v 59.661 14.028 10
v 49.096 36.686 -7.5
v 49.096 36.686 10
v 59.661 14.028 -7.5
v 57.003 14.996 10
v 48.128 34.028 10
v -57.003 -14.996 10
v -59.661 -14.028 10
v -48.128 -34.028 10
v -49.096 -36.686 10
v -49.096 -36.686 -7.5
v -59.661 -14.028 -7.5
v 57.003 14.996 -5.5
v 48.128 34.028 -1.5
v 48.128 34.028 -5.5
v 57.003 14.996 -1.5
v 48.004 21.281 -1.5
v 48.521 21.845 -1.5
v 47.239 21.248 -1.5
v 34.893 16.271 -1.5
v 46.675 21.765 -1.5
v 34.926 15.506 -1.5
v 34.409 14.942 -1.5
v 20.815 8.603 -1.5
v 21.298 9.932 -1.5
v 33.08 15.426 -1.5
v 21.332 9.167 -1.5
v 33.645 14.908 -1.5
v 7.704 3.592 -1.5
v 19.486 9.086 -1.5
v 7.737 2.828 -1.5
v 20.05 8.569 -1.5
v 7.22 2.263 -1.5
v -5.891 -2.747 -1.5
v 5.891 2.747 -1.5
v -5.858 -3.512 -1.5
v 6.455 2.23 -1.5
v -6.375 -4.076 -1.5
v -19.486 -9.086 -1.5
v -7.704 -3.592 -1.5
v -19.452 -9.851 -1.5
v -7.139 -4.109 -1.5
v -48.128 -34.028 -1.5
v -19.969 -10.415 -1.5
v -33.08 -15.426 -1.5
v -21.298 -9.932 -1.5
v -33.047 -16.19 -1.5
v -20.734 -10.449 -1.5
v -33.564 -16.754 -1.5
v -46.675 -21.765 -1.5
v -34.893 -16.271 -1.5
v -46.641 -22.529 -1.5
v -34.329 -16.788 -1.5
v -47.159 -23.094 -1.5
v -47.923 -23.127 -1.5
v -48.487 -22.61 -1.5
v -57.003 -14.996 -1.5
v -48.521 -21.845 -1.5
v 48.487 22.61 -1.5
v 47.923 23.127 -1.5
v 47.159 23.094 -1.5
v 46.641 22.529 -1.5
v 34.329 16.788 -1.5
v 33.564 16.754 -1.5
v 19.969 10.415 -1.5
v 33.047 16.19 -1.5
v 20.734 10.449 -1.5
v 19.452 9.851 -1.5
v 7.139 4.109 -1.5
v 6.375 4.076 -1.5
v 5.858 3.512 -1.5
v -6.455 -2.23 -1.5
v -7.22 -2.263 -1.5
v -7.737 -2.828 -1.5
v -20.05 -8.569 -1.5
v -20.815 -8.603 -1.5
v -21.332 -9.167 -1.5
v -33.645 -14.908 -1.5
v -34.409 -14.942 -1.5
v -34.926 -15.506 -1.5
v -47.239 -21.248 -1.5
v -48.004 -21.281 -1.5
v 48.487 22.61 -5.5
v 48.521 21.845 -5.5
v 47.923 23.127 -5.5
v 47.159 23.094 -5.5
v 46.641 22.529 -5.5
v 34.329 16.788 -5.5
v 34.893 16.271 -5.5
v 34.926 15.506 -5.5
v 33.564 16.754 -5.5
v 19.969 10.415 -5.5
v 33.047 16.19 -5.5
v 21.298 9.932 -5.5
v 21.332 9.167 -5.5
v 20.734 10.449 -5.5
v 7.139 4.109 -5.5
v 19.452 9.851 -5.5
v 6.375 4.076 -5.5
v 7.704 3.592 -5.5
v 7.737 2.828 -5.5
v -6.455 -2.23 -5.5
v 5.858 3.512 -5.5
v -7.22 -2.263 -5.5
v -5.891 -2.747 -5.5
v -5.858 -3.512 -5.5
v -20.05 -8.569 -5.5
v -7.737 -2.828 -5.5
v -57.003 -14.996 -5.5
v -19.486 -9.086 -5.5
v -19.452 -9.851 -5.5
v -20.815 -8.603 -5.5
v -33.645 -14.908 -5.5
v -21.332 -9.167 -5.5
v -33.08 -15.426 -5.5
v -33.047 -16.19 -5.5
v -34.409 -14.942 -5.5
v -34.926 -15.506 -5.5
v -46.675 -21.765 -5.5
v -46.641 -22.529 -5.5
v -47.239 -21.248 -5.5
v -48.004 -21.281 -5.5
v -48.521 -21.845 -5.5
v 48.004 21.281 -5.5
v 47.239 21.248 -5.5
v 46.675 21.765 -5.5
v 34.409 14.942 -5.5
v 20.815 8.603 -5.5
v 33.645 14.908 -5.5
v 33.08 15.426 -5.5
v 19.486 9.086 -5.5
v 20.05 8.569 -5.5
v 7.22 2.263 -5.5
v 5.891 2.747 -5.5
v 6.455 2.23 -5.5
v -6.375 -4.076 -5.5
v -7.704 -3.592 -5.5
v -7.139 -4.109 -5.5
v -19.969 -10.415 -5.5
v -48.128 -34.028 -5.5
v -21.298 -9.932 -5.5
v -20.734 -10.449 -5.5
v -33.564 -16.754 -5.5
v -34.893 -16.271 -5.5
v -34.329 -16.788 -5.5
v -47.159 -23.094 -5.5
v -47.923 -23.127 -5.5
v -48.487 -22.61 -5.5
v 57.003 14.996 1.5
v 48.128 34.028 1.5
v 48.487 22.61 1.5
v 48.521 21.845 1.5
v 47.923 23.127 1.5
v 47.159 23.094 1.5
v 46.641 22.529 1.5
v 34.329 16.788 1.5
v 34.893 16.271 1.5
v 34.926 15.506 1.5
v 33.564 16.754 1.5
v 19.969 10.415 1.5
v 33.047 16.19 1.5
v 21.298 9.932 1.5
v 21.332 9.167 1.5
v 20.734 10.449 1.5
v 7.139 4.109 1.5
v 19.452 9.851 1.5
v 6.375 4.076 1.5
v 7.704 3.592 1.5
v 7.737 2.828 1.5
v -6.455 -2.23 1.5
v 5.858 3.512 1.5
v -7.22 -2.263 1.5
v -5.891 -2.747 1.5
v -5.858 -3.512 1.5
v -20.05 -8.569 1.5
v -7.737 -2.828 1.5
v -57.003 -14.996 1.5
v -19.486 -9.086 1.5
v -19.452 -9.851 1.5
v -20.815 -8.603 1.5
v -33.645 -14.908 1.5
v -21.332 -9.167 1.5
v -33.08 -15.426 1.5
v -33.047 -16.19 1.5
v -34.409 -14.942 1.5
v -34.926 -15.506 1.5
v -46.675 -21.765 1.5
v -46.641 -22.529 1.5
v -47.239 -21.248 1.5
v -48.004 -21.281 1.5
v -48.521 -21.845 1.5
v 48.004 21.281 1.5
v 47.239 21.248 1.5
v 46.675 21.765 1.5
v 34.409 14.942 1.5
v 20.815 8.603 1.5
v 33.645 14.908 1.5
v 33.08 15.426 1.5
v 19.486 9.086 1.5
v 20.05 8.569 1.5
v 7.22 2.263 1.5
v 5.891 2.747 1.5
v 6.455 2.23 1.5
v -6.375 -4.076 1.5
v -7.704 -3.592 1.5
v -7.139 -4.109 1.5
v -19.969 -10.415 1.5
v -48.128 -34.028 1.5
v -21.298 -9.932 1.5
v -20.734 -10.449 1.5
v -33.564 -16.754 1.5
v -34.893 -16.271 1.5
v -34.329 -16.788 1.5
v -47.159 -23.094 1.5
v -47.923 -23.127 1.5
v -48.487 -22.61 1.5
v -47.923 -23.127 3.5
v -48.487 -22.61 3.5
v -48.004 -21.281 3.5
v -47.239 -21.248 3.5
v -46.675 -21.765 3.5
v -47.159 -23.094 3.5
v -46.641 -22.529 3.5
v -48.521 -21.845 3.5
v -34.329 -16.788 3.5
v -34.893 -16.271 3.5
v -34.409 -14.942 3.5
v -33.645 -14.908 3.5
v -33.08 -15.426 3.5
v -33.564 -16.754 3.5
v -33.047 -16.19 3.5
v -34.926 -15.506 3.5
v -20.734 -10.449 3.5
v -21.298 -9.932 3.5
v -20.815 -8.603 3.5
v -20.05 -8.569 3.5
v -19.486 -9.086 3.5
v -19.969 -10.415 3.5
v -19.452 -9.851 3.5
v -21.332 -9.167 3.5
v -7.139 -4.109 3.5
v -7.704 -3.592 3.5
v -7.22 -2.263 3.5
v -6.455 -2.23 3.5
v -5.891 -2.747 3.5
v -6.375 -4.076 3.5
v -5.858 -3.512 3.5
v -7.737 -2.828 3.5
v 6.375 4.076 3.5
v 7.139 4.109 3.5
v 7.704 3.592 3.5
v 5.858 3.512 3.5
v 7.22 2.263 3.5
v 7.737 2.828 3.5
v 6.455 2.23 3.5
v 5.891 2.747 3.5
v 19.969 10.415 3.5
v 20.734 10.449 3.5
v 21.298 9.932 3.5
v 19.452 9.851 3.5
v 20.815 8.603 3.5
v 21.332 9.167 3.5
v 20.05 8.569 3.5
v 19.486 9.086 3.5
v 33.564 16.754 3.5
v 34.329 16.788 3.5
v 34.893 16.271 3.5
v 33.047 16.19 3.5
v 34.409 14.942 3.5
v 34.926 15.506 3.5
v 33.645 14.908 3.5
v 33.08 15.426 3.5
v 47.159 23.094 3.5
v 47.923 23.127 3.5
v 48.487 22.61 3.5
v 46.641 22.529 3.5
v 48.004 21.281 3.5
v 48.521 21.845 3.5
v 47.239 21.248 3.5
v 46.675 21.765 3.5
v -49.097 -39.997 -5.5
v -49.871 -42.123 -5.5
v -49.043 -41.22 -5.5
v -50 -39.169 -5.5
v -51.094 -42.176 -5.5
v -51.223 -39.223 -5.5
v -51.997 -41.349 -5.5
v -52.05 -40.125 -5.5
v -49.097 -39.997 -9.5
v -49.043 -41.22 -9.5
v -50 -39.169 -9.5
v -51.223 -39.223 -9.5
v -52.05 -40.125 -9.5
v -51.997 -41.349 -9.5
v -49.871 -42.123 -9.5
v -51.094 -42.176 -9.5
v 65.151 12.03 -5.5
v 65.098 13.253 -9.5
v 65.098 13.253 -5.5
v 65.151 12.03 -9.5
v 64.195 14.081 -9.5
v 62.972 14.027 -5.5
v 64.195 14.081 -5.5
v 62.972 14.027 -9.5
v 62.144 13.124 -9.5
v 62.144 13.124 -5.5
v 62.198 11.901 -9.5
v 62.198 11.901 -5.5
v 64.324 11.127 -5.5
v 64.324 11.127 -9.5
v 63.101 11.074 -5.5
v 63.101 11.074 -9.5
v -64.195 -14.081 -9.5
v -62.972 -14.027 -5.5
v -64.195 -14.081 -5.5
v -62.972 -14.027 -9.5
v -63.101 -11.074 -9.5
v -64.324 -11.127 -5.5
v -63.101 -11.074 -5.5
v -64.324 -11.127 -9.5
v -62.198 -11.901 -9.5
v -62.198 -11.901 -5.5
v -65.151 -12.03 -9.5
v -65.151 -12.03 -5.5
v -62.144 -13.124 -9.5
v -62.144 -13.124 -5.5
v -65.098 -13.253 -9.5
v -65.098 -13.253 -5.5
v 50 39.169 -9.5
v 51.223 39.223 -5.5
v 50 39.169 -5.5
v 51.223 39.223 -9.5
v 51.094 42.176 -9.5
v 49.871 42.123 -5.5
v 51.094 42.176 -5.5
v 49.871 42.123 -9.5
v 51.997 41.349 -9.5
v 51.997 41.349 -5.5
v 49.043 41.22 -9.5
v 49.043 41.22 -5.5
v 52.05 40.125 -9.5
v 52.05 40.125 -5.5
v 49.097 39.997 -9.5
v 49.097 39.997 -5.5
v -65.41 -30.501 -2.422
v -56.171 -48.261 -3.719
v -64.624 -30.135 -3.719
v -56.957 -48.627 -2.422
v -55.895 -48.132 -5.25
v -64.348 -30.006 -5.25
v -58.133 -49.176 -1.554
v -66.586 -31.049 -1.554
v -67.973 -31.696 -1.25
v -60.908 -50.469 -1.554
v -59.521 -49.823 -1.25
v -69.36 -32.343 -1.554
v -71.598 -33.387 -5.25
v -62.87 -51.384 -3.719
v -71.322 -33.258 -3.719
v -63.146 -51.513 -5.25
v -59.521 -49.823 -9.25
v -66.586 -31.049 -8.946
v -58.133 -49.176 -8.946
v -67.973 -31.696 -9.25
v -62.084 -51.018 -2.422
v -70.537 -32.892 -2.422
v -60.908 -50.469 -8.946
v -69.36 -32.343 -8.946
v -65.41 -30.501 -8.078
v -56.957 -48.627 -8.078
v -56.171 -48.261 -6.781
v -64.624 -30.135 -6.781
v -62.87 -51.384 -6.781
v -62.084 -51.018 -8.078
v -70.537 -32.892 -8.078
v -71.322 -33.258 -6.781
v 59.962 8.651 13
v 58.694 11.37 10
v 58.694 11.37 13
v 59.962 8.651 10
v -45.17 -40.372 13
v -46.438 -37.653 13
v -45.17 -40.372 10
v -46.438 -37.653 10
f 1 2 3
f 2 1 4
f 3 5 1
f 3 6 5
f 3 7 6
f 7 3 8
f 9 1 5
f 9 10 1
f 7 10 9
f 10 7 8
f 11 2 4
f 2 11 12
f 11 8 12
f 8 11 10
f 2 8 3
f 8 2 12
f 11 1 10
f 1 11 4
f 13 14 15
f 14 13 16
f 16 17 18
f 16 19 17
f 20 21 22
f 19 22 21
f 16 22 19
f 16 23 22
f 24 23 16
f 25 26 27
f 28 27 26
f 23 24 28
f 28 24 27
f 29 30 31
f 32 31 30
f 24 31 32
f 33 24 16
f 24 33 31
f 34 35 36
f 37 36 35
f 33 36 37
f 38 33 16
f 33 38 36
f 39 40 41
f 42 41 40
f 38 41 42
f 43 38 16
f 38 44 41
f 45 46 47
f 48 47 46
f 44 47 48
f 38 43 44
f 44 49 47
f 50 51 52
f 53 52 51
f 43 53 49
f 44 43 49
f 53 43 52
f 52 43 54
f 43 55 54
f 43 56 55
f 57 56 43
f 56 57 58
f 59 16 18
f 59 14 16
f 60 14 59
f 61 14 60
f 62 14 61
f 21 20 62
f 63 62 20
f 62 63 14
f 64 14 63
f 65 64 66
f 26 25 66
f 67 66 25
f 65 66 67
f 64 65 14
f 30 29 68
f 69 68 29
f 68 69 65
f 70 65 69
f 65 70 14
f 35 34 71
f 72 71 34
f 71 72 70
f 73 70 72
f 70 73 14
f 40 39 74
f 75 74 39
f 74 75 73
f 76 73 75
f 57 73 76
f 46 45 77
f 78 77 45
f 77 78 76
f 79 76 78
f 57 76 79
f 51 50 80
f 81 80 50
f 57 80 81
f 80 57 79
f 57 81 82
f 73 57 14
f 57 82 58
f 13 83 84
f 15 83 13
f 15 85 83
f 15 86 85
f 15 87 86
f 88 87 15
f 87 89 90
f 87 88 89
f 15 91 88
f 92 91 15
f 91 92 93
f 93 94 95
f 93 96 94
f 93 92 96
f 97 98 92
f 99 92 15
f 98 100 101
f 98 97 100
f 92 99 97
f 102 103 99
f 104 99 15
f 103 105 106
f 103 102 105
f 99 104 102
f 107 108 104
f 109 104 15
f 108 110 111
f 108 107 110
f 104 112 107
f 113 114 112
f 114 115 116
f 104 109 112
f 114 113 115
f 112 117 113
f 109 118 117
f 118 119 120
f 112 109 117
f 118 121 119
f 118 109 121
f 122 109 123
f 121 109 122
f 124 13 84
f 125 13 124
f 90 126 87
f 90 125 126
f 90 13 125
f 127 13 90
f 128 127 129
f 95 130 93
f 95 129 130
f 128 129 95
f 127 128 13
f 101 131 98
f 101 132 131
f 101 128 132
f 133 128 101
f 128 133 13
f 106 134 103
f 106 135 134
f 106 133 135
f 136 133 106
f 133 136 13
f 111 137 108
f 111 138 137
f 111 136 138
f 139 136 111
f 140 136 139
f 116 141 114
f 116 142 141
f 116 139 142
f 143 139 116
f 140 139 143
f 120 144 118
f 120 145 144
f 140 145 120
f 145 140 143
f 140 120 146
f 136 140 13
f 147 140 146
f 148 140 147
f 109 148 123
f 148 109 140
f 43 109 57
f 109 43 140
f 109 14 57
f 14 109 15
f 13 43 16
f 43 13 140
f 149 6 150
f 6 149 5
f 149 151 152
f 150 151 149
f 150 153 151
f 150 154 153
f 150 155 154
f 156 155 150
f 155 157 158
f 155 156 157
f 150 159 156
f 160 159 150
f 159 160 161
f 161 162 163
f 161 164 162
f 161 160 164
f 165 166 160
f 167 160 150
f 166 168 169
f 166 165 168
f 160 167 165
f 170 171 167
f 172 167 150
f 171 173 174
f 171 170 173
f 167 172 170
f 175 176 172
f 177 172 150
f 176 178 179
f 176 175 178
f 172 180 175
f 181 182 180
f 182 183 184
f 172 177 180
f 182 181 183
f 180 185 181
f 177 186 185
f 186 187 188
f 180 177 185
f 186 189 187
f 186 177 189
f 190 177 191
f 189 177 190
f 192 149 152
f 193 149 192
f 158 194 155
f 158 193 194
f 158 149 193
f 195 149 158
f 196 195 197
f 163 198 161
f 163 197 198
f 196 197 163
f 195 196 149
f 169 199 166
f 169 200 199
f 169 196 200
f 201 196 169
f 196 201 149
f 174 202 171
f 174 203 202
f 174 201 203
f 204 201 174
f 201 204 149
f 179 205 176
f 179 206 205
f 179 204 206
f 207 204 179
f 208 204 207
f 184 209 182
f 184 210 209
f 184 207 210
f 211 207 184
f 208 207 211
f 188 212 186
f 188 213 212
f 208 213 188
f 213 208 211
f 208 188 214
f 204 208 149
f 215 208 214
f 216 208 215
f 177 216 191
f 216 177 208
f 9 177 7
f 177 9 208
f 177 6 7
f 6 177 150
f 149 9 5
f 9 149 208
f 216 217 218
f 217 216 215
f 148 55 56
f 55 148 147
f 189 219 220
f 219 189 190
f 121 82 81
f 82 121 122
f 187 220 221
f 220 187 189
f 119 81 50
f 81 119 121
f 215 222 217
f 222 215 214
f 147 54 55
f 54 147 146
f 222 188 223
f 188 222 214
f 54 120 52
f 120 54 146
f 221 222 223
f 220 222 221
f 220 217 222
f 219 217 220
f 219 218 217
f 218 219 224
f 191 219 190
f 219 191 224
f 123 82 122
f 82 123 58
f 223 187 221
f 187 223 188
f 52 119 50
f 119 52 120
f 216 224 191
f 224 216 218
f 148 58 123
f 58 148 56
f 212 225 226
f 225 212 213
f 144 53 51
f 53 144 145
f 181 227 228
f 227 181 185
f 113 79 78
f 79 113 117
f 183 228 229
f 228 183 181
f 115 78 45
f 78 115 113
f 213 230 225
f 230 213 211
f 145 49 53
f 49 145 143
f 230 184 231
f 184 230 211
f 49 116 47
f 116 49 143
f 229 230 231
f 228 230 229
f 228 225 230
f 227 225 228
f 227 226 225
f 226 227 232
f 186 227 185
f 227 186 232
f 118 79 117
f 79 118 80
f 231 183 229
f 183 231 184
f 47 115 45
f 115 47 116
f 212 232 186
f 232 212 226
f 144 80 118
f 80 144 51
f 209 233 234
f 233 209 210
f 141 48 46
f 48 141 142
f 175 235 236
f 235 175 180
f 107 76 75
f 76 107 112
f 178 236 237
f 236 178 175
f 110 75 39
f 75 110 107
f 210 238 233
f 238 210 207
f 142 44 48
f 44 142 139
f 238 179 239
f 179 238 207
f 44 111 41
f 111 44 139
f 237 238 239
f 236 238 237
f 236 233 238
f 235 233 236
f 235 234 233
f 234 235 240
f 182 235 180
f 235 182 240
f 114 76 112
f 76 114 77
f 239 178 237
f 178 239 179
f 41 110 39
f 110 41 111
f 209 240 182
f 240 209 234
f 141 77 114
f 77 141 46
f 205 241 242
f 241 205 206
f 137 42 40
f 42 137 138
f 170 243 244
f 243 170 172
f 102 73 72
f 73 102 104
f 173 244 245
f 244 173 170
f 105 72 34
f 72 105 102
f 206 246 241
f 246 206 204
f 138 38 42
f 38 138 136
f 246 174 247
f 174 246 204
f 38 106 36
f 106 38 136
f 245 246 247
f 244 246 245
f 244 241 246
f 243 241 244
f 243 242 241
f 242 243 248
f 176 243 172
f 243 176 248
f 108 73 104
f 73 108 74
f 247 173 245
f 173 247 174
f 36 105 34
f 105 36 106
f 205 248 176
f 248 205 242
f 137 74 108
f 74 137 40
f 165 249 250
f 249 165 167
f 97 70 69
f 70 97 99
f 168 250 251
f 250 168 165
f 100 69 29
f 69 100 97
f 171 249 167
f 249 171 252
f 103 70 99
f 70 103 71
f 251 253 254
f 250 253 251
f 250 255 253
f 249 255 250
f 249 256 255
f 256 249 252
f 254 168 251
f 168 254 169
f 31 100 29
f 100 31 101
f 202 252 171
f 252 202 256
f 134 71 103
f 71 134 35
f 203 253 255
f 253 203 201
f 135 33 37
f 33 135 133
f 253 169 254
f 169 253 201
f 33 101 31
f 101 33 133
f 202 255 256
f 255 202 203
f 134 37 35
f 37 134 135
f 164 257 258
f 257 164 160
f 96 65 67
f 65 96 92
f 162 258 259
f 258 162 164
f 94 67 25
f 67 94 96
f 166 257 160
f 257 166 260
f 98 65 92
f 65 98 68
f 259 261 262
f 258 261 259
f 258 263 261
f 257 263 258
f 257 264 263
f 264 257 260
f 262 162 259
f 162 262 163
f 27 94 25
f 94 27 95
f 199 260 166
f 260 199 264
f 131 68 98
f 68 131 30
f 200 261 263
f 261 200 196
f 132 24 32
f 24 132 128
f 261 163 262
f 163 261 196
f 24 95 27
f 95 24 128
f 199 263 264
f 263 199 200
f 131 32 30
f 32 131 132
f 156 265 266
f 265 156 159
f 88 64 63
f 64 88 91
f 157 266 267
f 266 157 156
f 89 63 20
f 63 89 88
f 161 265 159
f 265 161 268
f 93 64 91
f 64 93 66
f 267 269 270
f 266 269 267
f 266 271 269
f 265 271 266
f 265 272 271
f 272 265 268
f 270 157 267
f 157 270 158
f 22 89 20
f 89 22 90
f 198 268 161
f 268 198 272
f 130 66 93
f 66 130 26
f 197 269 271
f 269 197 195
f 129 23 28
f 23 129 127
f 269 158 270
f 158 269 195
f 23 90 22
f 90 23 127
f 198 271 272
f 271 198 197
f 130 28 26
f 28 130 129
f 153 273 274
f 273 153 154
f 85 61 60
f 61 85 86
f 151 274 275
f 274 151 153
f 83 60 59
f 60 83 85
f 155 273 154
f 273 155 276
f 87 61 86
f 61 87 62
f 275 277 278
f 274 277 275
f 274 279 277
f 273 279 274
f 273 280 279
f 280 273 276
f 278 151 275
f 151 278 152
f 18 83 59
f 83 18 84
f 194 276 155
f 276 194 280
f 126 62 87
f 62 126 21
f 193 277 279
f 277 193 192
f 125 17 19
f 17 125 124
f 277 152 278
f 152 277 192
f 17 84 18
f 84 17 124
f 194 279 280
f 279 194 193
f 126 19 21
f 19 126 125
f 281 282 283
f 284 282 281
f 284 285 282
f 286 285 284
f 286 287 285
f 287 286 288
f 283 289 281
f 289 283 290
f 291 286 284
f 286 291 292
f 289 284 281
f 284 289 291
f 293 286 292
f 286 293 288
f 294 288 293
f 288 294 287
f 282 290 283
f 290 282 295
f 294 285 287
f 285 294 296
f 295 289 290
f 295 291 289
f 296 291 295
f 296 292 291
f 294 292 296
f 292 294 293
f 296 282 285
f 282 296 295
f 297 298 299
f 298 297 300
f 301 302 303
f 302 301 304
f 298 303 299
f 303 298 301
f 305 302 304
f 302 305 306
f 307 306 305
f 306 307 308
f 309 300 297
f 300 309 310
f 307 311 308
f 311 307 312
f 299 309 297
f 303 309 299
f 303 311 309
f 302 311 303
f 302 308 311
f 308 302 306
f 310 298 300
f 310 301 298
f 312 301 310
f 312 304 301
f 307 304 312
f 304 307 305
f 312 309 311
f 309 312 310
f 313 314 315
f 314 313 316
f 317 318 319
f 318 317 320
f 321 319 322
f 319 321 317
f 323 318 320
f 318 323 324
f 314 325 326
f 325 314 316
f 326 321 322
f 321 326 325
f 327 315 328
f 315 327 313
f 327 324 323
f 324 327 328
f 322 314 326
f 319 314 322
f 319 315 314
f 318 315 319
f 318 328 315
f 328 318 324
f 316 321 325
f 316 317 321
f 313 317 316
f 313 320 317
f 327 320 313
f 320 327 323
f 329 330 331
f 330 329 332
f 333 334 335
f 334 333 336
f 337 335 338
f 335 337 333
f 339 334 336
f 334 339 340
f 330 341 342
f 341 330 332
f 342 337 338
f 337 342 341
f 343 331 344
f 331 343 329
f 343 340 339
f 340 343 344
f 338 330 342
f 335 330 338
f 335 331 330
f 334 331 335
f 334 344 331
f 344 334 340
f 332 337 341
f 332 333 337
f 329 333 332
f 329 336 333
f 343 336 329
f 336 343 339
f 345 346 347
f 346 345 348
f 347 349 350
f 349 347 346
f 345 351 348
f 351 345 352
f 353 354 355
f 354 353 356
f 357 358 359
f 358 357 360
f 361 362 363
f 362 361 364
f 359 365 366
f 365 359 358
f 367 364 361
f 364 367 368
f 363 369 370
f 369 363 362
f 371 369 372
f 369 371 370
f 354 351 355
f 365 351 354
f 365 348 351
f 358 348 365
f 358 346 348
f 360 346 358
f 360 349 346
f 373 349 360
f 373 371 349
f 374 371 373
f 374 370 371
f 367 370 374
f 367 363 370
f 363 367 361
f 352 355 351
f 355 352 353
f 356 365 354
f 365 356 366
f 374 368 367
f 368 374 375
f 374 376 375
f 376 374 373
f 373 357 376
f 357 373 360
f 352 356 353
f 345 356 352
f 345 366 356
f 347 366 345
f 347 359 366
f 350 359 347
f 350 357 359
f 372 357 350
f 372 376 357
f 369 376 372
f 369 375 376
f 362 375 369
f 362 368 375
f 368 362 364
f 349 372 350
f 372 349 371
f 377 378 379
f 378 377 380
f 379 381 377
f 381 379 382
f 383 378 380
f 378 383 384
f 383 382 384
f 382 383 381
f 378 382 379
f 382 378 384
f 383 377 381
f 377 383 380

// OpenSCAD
// Two-Stage Density Sorting Channel — Stage 2
// HUSKY-SORTER-001 | Topic 4 Day 2 | 2026-04-14
// *** REQUIRES TURBO BLOWER (300+ L/min) — 5015 INSUFFICIENT ***
// Fan: Turbo blower -> 25x10mm -> Medium vs Heavy separation
// Design: theta=25deg, v_air target 200-230cm/s
//
// v2 2026-05-17: Plenum moved BELOW channel, nozzles blow UPWARD through floor
// Previous: plenum was on side wall, nozzles blew sideways (rotate[90,0,0] error)
// Also fixed: stage2 baffle was entirely below channel floor (no escape path)
// Also fixed: nozzle dia 1.5mm -> 2.0mm for FDM printability

channel_L   = 120;
channel_W   = 25;
channel_H   = 10;
wall        = 2;
plenum_W    = 12;
plenum_H    = 6;
floor_H     = 1.5;
slope_deg   = 25;
baffle_H    = 3;

rotate([0, 0, slope_deg]) {
    difference() {
        // Outer shell
        translate([-channel_L/2, -channel_W/2, -(plenum_H + floor_H)])
            cube([channel_L, channel_W, channel_H + floor_H + plenum_H]);

        // Plenum cavity (bottom section)
        translate([-channel_L/2+wall, -channel_W/2+wall, -plenum_H-floor_H+wall])
            cube([channel_L-2*wall, channel_W-2*wall, plenum_H-wall]);

        // Channel interior (above floor)
        translate([-channel_L/2+wall, -channel_W/2+wall, floor_H])
            cube([channel_L-2*wall, channel_W-2*wall, channel_H]);
    }

    // Nozzle holes: vertical (Z-axis) through floor — 8x phi2mm
    for (i=[0:7]) {
        x = -channel_L/2 + (i+0.5)*(channel_L/8);
        translate([x, 0, -plenum_H])
            cylinder(h=plenum_H + floor_H + 2, d=2.0, $fn=8);
    }

    // Air inlet: horizontal into plenum from front face
    translate([-channel_L/2-15, 0, -(plenum_H+floor_H)/2 - floor_H])
        rotate([90, 0, 0]) cylinder(h=20, d=8, $fn=16);

    // Top escape baffle (at channel TOP where beans can escape upward)
    translate([-channel_L/2+2, -channel_W/2-wall-baffle_H, channel_H])
        cube([channel_L-4, baffle_H, baffle_H]);

    // Mounting flanges 4x M3
    for (pt=[[-channel_L/2-3,-channel_W/2-3],[ channel_L/2+3,-channel_W/2-3],
              [-channel_L/2-3, channel_W/2+3],[ channel_L/2+3, channel_W/2+3]])
        translate([pt[0], pt[1], -(plenum_H+floor_H)-2])
            cylinder(h=4, d=3.2, $fn=8);
}
echo("Stage-2 v2: 25x10mm, theta=25deg, TURBO BLOWER REQUIRED, plenum-below");
